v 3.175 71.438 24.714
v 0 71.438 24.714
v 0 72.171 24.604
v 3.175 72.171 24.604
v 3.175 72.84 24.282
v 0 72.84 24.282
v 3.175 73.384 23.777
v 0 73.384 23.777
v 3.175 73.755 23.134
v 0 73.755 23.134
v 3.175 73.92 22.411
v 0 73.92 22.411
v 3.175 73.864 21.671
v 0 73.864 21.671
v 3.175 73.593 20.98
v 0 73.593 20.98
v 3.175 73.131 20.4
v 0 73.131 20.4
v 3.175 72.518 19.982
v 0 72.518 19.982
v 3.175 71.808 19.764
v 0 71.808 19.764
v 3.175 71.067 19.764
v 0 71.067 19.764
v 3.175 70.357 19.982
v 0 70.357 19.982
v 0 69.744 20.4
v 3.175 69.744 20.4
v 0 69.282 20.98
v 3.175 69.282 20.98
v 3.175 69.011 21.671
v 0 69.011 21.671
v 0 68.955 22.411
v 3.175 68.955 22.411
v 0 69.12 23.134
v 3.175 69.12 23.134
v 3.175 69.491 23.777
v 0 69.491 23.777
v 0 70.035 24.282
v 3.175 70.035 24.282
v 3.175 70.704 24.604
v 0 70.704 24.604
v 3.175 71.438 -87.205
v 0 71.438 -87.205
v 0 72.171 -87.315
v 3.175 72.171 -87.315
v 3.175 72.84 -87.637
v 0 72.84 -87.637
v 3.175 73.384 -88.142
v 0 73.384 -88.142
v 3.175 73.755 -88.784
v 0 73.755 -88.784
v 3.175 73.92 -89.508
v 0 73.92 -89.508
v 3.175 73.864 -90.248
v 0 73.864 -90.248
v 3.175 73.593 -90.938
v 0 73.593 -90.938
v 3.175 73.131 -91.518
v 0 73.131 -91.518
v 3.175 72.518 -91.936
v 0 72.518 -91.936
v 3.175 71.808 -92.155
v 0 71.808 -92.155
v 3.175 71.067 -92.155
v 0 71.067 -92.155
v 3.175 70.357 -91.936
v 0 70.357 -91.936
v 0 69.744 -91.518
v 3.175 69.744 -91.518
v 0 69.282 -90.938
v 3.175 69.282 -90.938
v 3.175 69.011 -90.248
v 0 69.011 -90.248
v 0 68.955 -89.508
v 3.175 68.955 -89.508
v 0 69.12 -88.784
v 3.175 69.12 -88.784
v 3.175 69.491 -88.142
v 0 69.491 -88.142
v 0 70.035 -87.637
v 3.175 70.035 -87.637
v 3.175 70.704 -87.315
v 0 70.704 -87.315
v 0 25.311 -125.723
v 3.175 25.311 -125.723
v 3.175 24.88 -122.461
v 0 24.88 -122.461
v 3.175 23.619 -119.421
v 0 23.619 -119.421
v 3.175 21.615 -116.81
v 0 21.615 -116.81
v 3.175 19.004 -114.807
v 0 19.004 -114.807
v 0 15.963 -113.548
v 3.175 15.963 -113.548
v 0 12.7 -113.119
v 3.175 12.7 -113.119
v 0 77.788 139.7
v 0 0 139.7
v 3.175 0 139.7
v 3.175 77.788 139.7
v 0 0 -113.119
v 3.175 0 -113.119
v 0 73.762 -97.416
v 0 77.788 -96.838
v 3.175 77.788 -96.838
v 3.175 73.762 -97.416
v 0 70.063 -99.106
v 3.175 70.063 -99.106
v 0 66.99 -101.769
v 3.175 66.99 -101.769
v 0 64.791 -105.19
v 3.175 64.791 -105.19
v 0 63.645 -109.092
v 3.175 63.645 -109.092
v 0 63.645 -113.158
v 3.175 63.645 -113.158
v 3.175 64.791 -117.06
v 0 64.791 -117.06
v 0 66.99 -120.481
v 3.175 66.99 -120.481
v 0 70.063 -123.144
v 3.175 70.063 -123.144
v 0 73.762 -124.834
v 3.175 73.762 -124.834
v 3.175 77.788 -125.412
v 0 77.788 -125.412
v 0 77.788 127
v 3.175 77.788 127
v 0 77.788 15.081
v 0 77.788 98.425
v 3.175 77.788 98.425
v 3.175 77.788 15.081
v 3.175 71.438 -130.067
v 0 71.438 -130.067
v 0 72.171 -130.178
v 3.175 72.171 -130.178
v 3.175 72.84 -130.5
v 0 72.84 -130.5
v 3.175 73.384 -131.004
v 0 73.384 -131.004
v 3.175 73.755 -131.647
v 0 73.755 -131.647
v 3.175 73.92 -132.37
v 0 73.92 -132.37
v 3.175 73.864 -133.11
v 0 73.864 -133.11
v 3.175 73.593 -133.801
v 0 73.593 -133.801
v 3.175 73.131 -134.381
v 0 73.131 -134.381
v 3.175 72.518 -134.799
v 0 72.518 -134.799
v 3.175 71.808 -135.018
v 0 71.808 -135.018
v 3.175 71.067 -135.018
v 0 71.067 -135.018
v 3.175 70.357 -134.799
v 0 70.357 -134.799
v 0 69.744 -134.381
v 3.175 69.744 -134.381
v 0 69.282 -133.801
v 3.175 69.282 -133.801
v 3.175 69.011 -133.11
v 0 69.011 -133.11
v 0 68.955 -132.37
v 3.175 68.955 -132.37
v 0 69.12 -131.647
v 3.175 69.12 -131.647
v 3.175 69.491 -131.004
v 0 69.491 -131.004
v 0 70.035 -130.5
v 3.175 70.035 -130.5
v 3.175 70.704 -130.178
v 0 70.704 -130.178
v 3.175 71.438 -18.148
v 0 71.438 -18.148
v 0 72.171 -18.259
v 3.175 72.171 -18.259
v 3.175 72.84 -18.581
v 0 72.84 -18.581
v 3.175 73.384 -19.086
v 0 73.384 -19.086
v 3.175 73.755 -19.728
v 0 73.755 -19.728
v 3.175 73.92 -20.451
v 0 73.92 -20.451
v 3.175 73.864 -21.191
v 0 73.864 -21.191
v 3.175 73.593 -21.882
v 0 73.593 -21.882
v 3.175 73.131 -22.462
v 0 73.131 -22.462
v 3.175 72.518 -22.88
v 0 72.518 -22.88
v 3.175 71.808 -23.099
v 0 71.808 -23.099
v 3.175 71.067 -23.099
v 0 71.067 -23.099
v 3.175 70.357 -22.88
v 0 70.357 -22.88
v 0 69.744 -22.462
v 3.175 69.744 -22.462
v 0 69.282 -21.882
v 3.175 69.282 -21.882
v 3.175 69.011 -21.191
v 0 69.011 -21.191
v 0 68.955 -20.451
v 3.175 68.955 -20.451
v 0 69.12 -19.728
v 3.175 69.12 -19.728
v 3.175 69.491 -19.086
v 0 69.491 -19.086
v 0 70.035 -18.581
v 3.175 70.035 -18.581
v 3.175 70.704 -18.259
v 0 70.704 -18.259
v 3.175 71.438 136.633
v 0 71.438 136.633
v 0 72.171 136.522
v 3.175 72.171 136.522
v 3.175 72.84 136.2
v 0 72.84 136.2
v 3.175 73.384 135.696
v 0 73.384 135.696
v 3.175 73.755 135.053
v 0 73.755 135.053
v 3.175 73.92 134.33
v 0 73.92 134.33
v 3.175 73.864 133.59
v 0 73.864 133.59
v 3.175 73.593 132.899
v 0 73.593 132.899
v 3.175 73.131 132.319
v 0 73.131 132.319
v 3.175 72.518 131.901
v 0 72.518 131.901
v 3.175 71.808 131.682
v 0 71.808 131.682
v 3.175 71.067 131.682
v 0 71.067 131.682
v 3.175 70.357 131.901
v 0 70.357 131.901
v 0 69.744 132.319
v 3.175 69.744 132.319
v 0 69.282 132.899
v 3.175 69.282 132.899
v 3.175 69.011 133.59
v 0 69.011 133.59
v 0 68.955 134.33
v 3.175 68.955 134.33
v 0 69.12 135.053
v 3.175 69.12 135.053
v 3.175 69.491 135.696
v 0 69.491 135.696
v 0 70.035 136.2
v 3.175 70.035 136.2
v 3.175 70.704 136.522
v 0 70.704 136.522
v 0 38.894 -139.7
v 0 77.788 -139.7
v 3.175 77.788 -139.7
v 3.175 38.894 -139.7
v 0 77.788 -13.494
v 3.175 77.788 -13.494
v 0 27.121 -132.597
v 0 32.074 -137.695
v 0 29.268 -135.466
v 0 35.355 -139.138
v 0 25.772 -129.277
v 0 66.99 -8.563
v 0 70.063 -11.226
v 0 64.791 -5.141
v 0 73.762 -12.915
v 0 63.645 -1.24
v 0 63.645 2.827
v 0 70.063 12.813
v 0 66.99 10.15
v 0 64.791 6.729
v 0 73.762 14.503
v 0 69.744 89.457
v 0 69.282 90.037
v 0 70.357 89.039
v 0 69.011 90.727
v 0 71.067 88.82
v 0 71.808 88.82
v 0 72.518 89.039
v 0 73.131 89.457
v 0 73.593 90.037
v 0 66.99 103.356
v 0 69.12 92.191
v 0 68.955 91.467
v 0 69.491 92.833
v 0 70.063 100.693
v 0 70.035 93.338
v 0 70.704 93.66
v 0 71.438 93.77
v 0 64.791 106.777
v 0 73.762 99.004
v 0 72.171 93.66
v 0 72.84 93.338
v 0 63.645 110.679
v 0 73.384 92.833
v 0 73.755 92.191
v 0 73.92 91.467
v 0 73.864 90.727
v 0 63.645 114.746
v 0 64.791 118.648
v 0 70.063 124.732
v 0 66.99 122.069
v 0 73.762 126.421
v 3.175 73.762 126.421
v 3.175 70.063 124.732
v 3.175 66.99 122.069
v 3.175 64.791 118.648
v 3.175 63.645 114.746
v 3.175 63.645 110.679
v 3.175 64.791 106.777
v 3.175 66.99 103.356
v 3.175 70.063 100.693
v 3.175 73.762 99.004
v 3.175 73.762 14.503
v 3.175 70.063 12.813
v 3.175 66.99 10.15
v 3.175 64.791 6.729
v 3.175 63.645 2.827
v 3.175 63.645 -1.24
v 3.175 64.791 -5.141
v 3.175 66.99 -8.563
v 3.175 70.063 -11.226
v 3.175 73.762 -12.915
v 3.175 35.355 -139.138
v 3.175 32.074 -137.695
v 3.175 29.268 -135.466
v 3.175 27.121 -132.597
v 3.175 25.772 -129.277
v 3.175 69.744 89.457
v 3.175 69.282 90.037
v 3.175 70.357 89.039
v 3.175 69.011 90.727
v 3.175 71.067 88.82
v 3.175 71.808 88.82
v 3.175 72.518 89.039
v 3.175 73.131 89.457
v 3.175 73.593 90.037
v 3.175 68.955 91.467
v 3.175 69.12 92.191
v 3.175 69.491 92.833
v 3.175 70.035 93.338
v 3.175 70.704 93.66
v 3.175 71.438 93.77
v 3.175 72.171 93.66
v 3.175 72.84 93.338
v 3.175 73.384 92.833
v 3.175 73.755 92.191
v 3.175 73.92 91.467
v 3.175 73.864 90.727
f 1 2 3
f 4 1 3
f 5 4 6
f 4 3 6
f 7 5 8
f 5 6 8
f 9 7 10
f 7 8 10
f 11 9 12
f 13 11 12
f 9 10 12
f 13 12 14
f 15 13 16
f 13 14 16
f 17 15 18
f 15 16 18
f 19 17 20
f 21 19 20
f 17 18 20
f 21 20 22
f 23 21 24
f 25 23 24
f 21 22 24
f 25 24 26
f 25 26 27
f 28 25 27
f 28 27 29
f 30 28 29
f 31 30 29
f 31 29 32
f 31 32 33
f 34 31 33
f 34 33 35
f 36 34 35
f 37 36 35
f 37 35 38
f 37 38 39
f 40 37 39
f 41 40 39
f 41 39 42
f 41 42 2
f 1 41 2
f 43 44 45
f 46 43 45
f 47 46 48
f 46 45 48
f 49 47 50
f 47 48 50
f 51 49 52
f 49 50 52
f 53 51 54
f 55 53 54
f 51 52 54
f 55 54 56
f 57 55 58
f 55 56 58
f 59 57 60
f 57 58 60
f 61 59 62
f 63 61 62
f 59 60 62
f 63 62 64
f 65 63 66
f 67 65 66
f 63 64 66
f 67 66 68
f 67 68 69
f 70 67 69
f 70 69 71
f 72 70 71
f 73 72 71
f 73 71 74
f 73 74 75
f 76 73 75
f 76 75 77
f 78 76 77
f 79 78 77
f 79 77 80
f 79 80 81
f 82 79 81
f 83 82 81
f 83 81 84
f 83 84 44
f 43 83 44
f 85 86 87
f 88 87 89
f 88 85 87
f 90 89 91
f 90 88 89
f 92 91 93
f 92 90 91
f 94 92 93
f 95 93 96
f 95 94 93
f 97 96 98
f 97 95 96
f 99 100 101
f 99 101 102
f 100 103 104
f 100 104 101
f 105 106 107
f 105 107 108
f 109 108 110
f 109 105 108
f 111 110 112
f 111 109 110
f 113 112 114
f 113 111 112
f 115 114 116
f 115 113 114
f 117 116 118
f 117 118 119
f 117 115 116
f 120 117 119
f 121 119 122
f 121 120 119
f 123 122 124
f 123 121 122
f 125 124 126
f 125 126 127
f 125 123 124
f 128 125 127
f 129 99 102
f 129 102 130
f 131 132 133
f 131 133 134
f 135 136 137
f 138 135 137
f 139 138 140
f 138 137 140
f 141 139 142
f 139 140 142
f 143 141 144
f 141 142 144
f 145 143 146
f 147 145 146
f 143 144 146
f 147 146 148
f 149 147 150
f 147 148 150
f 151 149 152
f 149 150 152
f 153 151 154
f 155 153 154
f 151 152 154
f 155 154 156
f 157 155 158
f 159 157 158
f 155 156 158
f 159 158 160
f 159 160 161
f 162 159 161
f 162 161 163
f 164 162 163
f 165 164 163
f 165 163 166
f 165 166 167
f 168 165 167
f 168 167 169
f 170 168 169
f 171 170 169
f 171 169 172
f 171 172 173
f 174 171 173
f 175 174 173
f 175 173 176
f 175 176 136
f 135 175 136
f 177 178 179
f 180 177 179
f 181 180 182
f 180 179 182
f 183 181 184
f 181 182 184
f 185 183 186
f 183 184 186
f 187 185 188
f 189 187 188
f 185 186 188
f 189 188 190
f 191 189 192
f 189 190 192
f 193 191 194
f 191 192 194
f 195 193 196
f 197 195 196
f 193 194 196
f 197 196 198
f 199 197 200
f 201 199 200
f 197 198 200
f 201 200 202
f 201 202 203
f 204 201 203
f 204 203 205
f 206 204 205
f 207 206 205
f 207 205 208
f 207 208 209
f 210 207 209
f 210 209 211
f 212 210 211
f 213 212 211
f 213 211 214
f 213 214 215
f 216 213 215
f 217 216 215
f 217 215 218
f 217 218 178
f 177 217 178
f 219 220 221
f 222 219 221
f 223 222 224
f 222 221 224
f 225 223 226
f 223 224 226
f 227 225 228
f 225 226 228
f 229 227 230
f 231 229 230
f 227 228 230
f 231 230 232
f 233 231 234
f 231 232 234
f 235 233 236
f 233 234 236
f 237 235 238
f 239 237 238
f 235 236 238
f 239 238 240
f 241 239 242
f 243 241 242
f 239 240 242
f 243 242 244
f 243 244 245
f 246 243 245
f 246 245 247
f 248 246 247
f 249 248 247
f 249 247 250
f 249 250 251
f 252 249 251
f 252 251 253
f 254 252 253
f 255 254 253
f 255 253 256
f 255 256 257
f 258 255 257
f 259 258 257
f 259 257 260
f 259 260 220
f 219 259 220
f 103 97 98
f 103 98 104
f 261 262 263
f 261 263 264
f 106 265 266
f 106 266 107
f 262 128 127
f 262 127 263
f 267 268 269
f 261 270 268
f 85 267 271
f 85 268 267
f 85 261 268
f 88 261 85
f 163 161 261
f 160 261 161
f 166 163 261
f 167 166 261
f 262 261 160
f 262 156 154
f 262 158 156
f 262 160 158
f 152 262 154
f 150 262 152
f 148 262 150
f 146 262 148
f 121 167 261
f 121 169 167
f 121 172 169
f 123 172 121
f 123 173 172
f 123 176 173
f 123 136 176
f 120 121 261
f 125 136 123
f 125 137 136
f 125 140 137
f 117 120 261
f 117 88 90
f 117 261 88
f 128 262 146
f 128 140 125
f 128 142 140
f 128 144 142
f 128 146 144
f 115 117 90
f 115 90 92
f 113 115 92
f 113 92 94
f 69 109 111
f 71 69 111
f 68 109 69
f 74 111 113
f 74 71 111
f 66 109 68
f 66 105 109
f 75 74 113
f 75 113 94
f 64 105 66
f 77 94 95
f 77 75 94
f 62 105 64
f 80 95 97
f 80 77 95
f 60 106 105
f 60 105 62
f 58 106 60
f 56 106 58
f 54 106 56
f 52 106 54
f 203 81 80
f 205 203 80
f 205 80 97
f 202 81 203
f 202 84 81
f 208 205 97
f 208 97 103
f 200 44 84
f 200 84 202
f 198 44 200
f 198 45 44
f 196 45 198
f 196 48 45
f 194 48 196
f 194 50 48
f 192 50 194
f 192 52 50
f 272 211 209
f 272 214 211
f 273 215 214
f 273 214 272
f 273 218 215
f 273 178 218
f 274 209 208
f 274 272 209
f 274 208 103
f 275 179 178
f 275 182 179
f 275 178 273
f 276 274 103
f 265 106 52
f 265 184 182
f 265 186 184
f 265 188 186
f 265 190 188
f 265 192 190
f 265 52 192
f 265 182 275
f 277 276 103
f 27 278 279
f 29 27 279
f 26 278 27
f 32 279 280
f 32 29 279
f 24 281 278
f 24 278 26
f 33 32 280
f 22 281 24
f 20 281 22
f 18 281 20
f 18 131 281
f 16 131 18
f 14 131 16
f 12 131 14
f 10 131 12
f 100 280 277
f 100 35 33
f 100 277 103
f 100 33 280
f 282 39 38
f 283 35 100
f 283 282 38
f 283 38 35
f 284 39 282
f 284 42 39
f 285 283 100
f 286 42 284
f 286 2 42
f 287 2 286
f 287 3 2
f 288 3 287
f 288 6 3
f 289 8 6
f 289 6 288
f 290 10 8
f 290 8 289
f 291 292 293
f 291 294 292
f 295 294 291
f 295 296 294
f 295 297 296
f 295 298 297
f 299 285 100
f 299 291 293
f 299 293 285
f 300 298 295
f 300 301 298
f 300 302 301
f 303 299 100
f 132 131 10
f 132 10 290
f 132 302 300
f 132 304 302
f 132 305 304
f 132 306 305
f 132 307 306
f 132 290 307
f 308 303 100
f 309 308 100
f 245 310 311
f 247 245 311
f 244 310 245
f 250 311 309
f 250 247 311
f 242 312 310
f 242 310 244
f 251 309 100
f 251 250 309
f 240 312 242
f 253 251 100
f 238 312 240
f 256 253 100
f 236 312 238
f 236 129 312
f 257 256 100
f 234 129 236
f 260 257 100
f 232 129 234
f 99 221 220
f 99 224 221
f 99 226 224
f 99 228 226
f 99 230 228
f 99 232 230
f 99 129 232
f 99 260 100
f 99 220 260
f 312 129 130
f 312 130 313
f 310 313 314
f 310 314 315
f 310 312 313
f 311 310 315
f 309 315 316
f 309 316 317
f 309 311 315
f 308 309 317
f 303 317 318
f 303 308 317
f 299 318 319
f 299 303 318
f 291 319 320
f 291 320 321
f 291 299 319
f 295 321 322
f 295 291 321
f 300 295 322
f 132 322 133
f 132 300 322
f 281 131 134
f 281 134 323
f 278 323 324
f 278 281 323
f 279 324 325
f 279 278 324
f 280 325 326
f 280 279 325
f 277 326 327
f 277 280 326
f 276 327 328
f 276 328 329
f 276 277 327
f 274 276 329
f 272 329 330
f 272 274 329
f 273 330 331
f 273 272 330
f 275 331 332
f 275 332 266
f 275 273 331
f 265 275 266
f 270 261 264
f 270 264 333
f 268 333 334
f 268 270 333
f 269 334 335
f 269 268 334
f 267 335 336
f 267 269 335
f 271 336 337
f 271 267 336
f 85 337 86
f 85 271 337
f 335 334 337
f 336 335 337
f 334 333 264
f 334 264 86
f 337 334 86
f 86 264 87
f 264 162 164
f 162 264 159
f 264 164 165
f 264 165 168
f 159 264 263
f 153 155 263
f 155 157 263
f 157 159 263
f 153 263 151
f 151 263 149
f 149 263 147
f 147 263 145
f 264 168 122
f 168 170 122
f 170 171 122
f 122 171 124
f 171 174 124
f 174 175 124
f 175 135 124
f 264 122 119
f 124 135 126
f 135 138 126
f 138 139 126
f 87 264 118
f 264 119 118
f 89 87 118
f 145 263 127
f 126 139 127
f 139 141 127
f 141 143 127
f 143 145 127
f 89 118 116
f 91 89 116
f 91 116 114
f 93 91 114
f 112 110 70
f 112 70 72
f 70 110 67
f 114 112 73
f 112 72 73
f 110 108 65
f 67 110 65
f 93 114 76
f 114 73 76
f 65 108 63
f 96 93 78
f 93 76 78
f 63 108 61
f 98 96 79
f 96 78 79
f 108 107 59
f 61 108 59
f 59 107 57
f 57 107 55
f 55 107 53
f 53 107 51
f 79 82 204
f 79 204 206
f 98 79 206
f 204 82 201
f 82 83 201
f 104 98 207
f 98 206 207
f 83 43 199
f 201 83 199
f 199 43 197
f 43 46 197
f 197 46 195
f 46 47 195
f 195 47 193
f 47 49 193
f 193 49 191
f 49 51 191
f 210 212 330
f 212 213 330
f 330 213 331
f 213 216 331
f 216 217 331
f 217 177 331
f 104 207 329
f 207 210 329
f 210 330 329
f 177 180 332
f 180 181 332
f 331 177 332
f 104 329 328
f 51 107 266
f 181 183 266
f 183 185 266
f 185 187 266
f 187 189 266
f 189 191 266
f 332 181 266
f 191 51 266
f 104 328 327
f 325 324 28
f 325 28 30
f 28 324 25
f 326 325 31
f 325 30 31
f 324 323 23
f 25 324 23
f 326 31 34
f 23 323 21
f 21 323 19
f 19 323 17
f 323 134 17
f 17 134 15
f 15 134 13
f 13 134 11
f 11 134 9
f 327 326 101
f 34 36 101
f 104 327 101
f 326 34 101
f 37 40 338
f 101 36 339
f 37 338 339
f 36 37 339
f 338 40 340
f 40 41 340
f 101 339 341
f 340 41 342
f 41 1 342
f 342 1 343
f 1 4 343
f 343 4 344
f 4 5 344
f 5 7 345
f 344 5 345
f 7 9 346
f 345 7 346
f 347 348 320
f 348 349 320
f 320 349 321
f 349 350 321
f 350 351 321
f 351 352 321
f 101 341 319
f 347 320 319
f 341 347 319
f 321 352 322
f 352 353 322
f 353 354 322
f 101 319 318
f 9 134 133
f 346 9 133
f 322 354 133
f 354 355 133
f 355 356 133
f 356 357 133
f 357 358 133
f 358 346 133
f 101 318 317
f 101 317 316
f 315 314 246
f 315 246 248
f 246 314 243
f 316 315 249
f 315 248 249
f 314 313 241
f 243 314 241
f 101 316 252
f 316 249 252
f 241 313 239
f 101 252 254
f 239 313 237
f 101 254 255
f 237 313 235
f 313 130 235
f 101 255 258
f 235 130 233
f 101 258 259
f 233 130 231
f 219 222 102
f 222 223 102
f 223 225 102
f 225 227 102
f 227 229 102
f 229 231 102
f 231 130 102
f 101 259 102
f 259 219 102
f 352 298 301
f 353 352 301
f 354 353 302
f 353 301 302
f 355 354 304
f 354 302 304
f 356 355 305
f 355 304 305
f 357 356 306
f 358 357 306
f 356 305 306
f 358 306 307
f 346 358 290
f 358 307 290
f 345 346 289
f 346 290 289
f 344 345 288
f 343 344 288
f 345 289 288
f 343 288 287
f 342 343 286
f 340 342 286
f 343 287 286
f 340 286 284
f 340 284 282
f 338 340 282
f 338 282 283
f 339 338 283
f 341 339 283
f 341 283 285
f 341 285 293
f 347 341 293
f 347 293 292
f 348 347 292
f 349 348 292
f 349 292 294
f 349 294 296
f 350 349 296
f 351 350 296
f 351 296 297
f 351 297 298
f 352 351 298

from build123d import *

# Parameters (mm, degrees)
BOSS_EXTRUDE1_DEPTH    = 3.175
F_10_CLEARANCE_HOLE1_D = 4.9784
CUT_EXTRUDE1_DEPTH     = 160.928314508


with BuildPart() as part:
    # Sketch1 → Boss-Extrude1 (new body)
    with BuildSketch(Plane(origin=(0, 0, 0), x_dir=(0, 0, -1), z_dir=(1, 0, 0))):
        with BuildLine():
            Line((139.7, 0), (-139.7, 0))
            Line((-139.7, 0), (-139.7, 77.7875))
            Line((-139.7, 77.7875), (-127, 77.7875))
            ThreePointArc((-127, 77.7875), (-112.7125, 63.5), (-98.425, 77.7875))
            Line((-98.425, 77.7875), (-15.08125, 77.7875))
            ThreePointArc((-15.08125, 77.7875), (-0.79375, 63.5), (13.49375, 77.7875))
            Line((13.49375, 77.7875), (96.8375, 77.7875))
            ThreePointArc((96.8375, 77.7875), (111.125, 63.5), (125.4125, 77.7875))
            Line((125.4125, 77.7875), (139.7, 77.7875))
            Line((139.7, 77.7875), (139.7, 0))
        make_face()
    extrude(amount=BOSS_EXTRUDE1_DEPTH)

    # #10 Clearance Hole1 (through all)
    with Locations(Plane(origin=(3.175, 0, 0), x_dir=(0, 0, -1), z_dir=(1, 0, 0))):
        with Locations((-134.14375, 71.4375), (-91.28125, 71.4375), (-22.225, 71.4375), (20.6375, 71.4375), (89.69375, 71.4375), (132.55625, 71.4375)):
            Hole(F_10_CLEARANCE_HOLE1_D / 2)

    # Sketch4 → Cut-Extrude1 (cut, through all)
    with BuildSketch(Plane.ZY):
        with BuildLine():
            Line((-113.1189, 12.7), (-113.1189, 0))
            Line((-113.1189, 0), (-139.7, 0))
            Line((-139.7, 0), (-139.7, 38.89375))
            ThreePointArc((-139.7, 38.89375), (-135.465913951, 29.268268394), (-125.723317526, 25.31109823))
            ThreePointArc((-125.723317526, 25.31109823), (-116.810243373, 21.615031404), (-113.1189, 12.7))
        make_face()
    extrude(amount=-CUT_EXTRUDE1_DEPTH, mode=Mode.SUBTRACT)


solid = part.part
